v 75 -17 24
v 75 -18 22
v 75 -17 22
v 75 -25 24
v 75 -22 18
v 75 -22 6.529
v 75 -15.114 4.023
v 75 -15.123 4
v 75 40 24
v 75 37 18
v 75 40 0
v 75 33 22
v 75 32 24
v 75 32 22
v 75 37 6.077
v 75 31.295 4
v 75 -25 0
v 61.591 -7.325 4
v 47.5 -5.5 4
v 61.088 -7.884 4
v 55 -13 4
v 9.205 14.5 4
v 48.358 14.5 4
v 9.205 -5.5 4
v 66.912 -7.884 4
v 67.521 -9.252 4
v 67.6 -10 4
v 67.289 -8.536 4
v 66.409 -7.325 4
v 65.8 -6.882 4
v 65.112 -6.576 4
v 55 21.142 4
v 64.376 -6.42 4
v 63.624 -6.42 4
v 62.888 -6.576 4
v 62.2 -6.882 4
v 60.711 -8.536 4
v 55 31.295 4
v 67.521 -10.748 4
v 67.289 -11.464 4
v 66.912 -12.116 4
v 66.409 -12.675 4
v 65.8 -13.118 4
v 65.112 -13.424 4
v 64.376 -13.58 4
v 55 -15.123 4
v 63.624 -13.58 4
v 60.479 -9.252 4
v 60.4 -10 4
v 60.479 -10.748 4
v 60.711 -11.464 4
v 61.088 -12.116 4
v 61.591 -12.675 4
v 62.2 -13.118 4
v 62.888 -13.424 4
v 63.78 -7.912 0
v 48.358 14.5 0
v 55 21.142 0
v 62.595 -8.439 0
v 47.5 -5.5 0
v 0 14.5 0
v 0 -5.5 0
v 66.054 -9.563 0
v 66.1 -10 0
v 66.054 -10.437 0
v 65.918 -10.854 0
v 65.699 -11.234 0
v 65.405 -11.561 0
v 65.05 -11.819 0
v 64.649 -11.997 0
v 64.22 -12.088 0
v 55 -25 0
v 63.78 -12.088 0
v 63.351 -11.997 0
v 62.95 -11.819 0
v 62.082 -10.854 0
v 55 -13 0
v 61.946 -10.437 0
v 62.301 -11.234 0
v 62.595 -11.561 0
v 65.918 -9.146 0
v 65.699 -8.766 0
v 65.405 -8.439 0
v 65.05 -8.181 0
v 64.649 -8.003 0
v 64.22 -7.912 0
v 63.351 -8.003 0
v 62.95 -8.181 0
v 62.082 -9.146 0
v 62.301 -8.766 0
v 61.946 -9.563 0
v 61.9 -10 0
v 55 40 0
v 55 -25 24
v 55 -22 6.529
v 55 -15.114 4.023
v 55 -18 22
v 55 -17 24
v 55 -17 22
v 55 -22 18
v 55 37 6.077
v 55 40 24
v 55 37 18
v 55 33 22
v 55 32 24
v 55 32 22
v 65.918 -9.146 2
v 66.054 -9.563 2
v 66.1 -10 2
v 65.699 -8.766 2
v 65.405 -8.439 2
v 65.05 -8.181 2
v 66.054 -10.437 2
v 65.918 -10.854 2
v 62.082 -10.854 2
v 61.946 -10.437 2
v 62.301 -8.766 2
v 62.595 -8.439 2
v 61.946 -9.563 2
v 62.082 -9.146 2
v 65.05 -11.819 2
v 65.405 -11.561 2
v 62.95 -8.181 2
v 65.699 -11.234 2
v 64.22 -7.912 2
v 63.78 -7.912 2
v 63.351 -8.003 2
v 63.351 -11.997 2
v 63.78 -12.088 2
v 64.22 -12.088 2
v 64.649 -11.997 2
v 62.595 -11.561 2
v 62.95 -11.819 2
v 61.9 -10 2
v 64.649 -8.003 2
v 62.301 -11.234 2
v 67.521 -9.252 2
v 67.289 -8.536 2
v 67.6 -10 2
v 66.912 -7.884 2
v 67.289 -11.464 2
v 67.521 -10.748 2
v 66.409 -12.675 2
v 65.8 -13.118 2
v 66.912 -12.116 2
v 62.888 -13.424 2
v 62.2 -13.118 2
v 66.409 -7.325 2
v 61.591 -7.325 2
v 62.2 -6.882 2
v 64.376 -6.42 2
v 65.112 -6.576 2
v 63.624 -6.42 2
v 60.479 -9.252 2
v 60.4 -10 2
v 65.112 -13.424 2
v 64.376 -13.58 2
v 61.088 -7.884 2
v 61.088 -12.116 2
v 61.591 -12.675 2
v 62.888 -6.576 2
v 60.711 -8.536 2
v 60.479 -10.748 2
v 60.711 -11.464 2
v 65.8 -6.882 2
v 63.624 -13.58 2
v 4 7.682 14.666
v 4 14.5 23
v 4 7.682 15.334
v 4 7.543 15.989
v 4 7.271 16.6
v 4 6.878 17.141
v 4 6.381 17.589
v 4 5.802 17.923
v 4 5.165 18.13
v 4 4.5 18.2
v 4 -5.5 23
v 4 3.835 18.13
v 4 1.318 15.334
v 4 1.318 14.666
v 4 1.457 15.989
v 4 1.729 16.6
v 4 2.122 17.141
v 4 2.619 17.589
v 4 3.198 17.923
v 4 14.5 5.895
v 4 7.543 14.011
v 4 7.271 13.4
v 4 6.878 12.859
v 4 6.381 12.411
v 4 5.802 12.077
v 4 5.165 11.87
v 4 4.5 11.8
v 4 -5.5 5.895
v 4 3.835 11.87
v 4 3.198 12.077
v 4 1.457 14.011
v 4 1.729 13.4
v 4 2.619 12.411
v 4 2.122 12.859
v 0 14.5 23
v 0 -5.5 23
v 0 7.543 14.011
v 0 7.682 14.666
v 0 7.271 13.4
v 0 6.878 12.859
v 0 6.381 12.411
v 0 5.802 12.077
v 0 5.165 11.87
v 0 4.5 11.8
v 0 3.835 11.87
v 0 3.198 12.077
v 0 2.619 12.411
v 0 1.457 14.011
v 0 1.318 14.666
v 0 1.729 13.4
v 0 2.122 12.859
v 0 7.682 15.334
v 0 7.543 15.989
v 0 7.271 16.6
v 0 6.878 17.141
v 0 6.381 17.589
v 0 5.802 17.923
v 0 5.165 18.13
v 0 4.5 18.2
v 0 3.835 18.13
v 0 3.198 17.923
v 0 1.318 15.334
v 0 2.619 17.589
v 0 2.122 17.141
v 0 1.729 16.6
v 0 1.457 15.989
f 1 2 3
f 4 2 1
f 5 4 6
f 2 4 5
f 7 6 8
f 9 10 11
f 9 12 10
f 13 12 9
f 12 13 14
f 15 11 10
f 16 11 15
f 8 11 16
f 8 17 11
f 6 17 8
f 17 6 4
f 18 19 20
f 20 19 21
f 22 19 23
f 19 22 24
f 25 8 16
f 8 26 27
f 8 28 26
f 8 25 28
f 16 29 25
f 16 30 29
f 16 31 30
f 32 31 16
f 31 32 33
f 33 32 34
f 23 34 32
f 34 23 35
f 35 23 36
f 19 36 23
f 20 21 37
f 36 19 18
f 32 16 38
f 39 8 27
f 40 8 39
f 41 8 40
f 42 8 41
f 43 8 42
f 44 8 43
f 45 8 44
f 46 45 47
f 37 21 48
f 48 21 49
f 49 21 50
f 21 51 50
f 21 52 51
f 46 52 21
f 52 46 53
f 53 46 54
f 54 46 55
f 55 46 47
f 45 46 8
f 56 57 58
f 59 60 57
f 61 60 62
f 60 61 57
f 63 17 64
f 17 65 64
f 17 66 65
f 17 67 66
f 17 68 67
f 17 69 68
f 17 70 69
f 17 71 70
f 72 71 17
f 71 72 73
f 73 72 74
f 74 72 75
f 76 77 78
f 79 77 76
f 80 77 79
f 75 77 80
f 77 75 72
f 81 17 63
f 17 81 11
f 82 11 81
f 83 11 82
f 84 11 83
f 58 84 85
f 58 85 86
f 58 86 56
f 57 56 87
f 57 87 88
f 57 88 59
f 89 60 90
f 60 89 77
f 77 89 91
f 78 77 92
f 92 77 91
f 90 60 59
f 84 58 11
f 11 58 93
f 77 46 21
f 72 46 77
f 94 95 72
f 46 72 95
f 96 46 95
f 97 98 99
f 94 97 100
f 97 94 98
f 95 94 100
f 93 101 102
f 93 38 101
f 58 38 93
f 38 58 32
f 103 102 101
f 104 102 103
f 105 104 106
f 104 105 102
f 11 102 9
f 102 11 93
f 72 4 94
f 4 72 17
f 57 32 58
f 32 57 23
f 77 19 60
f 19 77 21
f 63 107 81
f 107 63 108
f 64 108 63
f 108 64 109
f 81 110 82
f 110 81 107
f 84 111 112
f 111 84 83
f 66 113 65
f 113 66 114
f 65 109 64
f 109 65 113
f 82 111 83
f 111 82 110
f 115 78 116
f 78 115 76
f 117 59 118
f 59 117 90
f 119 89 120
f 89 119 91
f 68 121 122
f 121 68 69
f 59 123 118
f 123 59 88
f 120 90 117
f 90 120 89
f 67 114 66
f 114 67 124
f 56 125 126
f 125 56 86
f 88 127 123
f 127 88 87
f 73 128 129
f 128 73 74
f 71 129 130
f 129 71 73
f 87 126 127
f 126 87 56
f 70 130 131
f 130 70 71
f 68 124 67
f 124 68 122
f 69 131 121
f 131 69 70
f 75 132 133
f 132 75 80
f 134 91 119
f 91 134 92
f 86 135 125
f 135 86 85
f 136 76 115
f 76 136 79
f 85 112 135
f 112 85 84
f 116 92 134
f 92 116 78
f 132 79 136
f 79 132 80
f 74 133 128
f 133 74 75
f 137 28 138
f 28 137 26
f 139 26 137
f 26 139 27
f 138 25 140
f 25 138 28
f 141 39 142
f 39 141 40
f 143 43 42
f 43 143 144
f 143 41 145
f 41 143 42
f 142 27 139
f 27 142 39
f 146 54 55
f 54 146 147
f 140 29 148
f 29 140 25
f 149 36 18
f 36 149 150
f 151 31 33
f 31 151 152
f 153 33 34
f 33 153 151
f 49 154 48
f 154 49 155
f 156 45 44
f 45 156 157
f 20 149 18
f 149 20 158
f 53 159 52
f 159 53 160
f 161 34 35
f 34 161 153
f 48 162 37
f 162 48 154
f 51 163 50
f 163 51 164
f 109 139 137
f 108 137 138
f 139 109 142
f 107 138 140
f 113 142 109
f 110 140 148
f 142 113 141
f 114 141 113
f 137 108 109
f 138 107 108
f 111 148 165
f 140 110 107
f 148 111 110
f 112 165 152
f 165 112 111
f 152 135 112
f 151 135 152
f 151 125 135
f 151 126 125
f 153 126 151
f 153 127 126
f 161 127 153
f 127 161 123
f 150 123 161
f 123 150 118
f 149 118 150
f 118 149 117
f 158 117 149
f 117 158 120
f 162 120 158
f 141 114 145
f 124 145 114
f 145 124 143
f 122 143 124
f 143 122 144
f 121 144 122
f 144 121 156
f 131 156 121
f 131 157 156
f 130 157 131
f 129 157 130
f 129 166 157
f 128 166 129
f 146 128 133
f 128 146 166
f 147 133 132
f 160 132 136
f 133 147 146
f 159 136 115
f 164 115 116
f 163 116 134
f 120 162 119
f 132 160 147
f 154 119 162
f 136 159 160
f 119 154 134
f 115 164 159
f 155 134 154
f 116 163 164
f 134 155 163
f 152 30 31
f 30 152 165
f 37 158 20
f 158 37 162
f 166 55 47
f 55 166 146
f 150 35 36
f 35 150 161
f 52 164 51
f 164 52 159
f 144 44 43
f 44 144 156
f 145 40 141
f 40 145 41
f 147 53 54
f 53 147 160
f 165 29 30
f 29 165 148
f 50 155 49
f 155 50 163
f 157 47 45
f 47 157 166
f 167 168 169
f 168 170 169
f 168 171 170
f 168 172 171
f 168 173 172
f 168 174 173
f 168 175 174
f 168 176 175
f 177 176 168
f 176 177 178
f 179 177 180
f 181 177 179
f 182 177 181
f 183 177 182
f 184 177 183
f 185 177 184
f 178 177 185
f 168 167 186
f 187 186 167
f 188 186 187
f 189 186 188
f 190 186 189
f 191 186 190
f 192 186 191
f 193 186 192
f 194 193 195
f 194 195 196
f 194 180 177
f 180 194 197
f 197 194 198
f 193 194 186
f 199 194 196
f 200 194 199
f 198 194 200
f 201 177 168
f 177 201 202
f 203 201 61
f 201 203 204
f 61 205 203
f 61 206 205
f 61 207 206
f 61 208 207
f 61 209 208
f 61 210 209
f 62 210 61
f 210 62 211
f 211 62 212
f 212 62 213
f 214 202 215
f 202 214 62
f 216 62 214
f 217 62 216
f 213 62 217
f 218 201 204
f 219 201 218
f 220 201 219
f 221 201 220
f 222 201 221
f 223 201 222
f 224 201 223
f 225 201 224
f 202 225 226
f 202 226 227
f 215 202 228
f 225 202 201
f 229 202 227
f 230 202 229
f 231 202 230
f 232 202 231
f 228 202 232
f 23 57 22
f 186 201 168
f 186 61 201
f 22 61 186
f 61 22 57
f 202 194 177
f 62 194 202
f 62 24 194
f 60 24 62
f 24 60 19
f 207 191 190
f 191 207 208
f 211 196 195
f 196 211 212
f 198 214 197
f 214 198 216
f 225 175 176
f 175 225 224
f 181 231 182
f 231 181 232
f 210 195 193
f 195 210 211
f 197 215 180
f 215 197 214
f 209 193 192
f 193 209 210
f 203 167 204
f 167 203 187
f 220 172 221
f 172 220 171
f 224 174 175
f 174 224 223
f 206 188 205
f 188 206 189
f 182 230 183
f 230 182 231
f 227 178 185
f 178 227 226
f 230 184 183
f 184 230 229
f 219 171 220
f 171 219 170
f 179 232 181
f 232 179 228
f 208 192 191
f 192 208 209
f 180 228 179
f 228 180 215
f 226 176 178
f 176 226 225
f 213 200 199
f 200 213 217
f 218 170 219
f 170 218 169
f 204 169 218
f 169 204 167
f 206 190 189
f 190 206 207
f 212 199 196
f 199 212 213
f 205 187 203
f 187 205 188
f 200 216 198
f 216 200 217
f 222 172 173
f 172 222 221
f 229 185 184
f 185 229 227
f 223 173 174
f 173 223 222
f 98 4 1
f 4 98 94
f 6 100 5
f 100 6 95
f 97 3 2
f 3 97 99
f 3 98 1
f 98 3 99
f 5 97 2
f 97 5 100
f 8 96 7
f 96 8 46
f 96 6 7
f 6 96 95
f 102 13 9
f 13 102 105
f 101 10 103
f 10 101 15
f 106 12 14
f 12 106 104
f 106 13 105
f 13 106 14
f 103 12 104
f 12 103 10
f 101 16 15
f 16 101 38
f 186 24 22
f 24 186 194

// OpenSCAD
// mount for video cam

//base

  translate([0,-5.5,0]) cube([65,20,4]);
  difference () {
    union () {
     translate([55,-25, 0]) cube([20,65,4]);
     translate([45,-3,0]) rotate([0,0,45]) cube([38,10,4]);
     translate([45,-3,0]) rotate([0,0,-45]) cube([28,10,4]);
     }
    translate([64,-10,-1]) cylinder (h=10,r=2.1, $fn=30); //mount hole
    translate([64,-10,2]) cylinder (h=3,r=3.6, $fn=30); //mount hole
   }


// Bottom clip
difference () {
   translate([0,-5.5,0]) cube([4,20,23]);
   translate([-2,4.5,15]) rotate ([0,90,0]) cylinder (h=10,r=3.2, $fn=30); //tripod hole
}
translate([8.5,-5.5,0]) rotate([20,0,90]) cube([20,8,4]);

// Right Clip
union () {
translate([55,-25,0]) cube([20,3,24]);
translate([55,-25,22]) cube([20,8,2]);
translate([55,-22,18]) rotate([45,0,0]) cube([20,6,2]);
translate([55,-23,20]) cube([20,3,3]);
translate([55,-24,3]) rotate([-20,0,0]) cube([20,8,4]);
}

// Left Clip
union () {
translate([55,37,0]) cube([20,3,24]);
translate([55,32,22]) cube([20,8,2]);
translate([55,33,22]) rotate([-45,0,0]) cube([20,6,2]);
translate([55,35,20]) cube([20,3,3]);
translate([55,32,0]) rotate([20,0,0]) cube([20,8,4]);
}
